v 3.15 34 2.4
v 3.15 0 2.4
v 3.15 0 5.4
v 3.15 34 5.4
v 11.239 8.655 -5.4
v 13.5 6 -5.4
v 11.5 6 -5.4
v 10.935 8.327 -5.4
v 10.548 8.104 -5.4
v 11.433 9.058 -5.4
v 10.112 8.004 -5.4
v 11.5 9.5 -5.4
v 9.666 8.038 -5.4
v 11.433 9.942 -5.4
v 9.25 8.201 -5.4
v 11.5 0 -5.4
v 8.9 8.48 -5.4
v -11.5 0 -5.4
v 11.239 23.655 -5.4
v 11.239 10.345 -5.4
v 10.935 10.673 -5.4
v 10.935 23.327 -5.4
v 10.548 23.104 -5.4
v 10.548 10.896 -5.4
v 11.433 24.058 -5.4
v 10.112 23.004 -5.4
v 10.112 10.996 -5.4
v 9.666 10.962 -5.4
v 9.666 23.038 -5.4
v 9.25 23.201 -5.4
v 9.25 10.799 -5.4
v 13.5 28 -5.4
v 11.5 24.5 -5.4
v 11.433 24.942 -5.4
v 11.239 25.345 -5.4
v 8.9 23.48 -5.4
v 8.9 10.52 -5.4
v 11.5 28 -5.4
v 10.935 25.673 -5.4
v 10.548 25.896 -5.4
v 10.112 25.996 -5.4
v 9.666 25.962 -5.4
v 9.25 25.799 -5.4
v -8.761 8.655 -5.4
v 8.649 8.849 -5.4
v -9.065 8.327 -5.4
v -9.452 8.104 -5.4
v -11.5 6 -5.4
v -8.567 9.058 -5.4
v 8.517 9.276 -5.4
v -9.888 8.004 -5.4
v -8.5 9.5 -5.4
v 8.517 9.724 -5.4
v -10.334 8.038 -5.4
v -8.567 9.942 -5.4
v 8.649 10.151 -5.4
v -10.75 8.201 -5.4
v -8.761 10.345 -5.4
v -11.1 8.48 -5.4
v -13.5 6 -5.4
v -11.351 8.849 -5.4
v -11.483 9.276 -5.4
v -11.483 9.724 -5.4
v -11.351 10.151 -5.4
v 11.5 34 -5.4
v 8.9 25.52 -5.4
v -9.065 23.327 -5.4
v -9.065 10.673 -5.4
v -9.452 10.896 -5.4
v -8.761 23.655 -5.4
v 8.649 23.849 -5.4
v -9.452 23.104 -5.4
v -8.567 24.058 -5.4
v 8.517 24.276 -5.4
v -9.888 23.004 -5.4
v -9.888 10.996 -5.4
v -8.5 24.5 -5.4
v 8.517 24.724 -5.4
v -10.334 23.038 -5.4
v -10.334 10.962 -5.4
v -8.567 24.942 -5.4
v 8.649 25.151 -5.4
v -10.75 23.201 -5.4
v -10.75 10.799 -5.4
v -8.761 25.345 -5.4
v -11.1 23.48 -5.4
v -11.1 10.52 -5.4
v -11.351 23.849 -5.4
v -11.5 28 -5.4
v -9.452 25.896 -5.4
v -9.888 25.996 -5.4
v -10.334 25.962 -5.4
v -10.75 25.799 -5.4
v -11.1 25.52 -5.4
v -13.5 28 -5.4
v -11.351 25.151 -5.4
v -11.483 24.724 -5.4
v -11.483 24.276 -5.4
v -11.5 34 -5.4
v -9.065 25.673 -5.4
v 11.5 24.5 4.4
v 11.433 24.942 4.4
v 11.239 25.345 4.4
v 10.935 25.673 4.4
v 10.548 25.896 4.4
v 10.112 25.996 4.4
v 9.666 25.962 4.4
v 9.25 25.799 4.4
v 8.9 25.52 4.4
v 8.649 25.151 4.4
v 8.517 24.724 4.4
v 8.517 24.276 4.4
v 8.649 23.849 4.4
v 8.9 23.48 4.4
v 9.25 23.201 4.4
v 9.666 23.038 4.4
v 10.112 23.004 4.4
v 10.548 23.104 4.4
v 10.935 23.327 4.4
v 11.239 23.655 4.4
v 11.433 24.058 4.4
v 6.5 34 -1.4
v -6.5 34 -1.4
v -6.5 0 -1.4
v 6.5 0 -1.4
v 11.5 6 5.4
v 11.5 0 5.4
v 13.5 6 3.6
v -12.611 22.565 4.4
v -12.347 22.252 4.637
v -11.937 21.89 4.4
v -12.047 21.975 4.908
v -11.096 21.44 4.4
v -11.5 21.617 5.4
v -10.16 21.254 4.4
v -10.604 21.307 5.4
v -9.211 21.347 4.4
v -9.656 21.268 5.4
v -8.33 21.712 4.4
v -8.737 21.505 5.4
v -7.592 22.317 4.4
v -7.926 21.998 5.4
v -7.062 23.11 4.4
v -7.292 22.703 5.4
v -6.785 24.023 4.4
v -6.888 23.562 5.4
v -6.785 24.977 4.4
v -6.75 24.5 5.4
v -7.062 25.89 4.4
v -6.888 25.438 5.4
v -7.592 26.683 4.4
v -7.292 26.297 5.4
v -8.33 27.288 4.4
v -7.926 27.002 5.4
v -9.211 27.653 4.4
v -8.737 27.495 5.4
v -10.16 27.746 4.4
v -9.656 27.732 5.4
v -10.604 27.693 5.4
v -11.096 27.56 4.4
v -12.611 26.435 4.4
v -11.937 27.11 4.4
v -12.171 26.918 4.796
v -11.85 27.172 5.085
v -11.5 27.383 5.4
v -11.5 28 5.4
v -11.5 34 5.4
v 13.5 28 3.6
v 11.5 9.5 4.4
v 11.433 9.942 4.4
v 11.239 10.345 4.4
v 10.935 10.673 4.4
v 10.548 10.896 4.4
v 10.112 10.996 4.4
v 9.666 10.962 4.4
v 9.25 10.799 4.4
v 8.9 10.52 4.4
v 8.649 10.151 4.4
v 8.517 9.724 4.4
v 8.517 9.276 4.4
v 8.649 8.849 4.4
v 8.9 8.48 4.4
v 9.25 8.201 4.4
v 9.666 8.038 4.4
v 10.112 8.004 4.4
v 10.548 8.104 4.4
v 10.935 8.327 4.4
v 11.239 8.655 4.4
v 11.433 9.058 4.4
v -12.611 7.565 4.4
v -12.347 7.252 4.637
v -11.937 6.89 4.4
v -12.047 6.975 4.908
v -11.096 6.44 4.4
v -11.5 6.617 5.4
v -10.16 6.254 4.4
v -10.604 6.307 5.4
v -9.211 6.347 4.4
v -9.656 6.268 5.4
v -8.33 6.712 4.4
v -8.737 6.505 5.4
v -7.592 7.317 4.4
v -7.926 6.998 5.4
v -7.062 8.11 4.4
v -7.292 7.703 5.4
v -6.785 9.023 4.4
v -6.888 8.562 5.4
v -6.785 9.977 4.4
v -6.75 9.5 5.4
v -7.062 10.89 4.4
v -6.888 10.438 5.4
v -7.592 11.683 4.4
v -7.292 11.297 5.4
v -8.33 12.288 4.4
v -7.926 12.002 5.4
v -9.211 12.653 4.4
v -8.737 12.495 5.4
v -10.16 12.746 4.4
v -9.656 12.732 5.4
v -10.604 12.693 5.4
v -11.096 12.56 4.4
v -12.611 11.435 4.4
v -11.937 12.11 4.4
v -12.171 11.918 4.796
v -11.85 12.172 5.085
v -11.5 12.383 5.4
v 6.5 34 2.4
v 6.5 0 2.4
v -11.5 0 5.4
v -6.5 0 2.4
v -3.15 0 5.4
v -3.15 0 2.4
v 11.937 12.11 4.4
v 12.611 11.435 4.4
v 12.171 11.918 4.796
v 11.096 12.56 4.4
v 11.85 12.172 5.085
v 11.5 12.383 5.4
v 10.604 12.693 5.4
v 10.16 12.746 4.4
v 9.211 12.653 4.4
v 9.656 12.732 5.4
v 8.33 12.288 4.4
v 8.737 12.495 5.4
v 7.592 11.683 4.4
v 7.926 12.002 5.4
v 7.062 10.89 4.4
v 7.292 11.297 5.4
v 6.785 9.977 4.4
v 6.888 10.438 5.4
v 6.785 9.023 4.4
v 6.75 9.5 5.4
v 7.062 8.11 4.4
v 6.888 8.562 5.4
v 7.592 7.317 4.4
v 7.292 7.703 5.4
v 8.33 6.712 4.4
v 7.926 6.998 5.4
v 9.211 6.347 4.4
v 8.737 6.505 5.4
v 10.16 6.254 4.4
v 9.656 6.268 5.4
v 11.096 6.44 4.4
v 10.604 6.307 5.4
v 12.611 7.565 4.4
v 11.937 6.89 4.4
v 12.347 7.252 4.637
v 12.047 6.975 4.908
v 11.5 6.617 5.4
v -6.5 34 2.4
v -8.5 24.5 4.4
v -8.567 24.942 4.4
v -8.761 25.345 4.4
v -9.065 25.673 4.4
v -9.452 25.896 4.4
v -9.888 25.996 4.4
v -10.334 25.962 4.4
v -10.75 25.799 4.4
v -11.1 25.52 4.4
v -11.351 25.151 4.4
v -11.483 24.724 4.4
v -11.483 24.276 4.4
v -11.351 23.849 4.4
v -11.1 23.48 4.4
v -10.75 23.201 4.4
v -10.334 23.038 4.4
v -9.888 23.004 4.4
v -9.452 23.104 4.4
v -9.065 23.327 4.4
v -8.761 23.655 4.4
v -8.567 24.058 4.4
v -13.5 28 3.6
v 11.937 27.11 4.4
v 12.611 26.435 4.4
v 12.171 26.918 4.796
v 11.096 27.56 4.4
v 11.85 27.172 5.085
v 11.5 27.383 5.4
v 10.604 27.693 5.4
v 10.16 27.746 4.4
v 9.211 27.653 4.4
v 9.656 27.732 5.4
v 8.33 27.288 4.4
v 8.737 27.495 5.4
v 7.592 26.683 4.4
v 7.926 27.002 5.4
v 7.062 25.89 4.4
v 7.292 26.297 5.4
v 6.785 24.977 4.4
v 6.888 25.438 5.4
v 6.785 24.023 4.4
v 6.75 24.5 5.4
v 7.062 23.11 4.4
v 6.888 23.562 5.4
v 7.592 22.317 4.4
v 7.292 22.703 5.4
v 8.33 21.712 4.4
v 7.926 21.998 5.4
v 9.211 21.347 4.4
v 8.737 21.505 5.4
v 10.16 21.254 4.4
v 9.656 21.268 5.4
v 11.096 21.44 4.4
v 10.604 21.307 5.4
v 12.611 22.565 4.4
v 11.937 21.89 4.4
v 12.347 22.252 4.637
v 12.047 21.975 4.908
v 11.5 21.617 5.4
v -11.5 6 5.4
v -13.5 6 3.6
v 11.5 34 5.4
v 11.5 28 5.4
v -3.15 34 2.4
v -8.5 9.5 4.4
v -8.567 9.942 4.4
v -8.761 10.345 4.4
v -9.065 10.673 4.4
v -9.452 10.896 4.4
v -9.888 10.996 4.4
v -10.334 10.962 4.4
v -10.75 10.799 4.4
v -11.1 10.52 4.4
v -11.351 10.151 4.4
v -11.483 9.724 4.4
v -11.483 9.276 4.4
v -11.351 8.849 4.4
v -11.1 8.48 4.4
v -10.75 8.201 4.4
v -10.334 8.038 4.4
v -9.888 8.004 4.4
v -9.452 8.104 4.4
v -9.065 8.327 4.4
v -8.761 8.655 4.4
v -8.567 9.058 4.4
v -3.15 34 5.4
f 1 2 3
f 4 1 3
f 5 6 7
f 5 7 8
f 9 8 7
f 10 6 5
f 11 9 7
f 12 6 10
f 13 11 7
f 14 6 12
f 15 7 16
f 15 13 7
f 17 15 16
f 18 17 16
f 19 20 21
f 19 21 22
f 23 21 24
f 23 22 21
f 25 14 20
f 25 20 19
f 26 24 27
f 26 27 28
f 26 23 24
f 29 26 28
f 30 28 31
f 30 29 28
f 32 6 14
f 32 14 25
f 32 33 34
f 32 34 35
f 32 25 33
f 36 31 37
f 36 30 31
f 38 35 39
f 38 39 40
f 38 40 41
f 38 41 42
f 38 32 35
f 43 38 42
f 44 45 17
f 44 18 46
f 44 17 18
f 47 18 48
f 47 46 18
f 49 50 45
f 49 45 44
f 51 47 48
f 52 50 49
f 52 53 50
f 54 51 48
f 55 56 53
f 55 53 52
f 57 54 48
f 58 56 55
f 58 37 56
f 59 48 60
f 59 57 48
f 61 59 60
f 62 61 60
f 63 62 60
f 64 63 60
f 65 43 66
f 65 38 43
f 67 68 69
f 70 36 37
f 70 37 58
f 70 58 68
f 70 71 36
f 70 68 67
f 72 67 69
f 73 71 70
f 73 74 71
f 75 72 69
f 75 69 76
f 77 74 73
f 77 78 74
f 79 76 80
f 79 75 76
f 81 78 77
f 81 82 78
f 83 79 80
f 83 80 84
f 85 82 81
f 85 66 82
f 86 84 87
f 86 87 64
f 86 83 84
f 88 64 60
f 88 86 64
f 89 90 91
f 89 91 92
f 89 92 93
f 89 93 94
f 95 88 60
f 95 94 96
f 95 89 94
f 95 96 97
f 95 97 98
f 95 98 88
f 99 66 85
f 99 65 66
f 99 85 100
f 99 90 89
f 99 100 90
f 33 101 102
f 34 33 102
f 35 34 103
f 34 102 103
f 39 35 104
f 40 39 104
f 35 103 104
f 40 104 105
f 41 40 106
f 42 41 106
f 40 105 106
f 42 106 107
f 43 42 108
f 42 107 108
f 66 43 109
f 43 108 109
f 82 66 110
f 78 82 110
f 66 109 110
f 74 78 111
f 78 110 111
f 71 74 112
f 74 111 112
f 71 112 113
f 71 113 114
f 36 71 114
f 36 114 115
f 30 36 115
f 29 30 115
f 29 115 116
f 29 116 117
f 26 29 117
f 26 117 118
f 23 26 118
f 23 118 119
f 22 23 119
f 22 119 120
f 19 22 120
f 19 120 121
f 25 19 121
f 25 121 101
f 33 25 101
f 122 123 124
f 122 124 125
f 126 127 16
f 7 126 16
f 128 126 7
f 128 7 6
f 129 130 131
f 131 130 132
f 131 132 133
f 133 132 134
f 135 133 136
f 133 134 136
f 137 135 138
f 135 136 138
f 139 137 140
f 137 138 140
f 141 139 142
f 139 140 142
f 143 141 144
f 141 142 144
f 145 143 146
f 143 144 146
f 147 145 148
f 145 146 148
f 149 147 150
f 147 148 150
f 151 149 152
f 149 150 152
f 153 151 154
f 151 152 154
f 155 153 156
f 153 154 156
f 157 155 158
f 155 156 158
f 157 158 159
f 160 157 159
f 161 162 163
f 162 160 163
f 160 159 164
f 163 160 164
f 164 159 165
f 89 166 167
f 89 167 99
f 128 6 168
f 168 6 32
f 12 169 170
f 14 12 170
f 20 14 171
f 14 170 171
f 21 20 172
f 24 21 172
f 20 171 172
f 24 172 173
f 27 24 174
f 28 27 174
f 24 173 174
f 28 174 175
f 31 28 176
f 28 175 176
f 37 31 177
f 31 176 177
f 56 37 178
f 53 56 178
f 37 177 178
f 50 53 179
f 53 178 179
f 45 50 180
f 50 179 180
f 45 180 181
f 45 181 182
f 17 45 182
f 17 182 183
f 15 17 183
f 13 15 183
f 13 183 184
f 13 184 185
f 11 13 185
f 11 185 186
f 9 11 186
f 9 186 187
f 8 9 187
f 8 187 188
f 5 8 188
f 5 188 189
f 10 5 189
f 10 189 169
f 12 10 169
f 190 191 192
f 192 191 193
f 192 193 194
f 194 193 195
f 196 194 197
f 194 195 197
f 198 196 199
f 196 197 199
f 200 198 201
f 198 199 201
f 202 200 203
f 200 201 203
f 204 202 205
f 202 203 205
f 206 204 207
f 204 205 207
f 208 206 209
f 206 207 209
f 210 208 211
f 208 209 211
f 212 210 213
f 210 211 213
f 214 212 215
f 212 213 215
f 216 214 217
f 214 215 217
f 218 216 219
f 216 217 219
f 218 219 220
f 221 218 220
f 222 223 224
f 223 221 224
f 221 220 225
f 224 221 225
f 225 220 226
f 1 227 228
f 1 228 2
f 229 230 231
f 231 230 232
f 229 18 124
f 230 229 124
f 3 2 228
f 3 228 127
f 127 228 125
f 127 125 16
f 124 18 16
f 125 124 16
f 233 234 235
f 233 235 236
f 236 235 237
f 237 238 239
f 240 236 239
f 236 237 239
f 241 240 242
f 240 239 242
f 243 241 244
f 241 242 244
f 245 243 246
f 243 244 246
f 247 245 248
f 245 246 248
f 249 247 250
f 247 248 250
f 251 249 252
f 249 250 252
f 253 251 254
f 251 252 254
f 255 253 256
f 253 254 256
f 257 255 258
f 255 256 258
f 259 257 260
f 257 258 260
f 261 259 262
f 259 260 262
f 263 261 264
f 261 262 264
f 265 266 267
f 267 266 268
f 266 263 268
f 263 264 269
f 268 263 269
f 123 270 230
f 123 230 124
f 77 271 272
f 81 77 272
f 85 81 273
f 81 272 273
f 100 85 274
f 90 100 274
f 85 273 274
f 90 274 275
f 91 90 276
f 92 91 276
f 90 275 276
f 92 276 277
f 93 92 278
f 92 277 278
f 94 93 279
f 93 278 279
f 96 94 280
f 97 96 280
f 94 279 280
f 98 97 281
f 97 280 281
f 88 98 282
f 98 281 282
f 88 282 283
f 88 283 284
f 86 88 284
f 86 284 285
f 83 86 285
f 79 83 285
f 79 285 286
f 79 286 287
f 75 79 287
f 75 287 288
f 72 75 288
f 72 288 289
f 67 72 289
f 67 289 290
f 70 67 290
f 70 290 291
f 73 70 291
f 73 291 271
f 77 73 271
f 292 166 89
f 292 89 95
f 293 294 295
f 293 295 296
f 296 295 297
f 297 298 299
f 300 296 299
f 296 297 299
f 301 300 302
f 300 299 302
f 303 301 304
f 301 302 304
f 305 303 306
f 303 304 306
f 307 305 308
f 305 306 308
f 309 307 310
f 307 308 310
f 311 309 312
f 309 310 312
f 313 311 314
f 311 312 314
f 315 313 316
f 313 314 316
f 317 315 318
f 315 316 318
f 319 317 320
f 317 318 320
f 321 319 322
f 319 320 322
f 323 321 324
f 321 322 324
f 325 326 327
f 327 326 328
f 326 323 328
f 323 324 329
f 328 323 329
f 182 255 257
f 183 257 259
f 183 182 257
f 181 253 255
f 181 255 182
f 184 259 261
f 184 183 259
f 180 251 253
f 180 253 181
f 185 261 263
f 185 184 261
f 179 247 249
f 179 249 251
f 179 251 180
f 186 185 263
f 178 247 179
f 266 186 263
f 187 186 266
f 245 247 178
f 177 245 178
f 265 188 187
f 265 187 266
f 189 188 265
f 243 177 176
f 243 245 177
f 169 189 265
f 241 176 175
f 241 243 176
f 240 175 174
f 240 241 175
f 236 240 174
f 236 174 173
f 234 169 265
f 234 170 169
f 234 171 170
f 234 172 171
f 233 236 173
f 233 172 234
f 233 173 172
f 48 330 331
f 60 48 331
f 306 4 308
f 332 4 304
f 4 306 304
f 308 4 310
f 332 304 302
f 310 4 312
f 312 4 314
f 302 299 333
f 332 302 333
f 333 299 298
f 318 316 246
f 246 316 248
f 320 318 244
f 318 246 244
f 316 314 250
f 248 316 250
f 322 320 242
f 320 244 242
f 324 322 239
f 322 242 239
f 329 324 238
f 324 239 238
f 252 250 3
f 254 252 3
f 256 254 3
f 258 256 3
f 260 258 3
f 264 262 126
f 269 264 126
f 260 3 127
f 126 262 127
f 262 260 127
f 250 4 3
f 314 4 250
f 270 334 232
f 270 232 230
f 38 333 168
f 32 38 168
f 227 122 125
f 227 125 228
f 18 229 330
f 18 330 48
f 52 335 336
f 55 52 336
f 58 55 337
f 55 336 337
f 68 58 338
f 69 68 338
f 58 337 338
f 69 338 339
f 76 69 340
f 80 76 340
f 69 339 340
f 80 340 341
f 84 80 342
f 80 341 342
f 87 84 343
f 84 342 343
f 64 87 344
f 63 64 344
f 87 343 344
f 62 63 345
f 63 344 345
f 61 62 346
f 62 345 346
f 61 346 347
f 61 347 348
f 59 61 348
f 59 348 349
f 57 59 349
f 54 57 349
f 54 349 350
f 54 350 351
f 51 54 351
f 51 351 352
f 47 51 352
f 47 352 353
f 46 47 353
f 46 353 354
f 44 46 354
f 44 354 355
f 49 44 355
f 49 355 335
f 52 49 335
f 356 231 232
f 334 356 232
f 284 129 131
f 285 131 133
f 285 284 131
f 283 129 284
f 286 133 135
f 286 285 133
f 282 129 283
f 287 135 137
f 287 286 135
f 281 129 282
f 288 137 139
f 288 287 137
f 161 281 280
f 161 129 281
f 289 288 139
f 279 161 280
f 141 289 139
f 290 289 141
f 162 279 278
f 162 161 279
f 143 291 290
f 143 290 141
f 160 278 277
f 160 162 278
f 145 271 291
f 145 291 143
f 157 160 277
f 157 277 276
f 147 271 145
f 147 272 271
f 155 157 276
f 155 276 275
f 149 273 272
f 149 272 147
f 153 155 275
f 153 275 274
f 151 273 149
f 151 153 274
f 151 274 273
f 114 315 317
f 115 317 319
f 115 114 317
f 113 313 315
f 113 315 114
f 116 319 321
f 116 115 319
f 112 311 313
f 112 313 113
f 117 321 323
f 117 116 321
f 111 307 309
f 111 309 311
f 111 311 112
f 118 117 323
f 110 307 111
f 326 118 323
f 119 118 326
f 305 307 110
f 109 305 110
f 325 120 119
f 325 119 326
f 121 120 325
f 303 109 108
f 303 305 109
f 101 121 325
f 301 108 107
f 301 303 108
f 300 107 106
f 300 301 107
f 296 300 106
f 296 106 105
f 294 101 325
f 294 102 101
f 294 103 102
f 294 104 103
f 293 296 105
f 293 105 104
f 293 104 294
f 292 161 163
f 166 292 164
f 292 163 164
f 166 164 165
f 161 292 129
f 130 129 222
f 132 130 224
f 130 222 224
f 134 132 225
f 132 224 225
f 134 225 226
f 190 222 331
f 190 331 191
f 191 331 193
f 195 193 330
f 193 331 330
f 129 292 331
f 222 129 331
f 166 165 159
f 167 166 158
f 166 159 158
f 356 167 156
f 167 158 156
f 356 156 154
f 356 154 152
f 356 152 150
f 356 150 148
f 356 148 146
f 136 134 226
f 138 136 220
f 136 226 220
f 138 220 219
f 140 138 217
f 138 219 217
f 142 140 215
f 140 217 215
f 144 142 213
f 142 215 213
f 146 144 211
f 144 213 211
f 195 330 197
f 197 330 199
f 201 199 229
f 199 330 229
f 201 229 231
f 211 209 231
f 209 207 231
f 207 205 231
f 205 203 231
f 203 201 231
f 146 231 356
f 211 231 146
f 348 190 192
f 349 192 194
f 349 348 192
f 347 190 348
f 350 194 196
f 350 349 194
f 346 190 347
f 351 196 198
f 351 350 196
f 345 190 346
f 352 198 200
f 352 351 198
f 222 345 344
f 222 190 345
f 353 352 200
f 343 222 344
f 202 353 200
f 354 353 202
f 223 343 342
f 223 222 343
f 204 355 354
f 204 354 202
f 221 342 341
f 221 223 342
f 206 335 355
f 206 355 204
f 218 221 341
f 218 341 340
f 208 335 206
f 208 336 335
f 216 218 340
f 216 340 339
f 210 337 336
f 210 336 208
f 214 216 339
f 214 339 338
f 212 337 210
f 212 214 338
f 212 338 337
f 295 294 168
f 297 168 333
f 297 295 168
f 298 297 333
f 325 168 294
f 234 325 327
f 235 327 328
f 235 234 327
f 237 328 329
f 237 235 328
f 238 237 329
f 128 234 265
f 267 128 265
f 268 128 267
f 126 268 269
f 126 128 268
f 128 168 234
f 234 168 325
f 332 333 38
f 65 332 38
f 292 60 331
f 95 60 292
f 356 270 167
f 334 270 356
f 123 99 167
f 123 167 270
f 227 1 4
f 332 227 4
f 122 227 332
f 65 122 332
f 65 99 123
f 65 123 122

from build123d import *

# Parameters (mm, degrees)
SKETCH_1_W          = 23
SKETCH_1_H          = 10.8
EXTRUDE_1_DEPTH     = 34
CUT_EXTRUDE_1_DEPTH = 35
SKETCH_3_W          = 7
SKETCH_3_H          = 22
EXTRUDE_2_DEPTH     = 9
EXTRUDE_3_DEPTH     = 22
SKETCH_7_R          = 3.25
CUT_EXTRUDE_7_DEPTH = 1
CUT_EXTRUDE_8_REACH = 11.8
SKETCH_8_R          = 1.5


with BuildPart() as part:
    # 草图1 → 凸台-拉伸1 (new body)
    with BuildSketch(Plane(origin=(0, 0, 0), x_dir=(1, 0, 0), z_dir=(0, 1, 0))):
        Rectangle(SKETCH_1_W, SKETCH_1_H)
    extrude(amount=EXTRUDE_1_DEPTH)

    # 草图2 → 切除-拉伸1 (cut, through all)
    with BuildSketch(Plane(origin=(0, 34, 0), x_dir=(1, 0, 0), z_dir=(0, 1, 0))):
        Polygon((-6.5, 1.4), (6.5, 1.4), (6.5, -2.4), (3.15, -2.4), (3.15, -5.4), (-3.15, -5.4), (-3.15, -2.4), (-6.5, -2.4), align=None)
    extrude(amount=-CUT_EXTRUDE_1_DEPTH, mode=Mode.SUBTRACT)

    # 草图3 → 凸台-拉伸2 (add)
    with BuildSketch(Plane(origin=(0, 0, -5.4), x_dir=(-1, 0, 0), z_dir=(0, 0, -1))):
        with Locations((-10, 17)):
            Rectangle(SKETCH_3_W, SKETCH_3_H)
        with Locations((10, 17)):
            Rectangle(SKETCH_3_W, SKETCH_3_H)
    extrude(amount=-EXTRUDE_2_DEPTH)

    # 草图5 → 凸台-拉伸3 (add)
    with BuildSketch(Plane.XZ.offset(-6)):
        Polygon((11.5, 5.4), (11.5, 3.6), (13.5, 3.6), align=None)
        Polygon((-13.5, 3.6), (-11.5, 5.4), (-11.5, 3.6), align=None)
    extrude(amount=-EXTRUDE_3_DEPTH)

    # 草图7 → 切除-拉伸7 (cut)
    with BuildSketch(Plane.XY.offset(5.4)):
        with Locations((-10, 24.5)):
            Circle(SKETCH_7_R)
        with Locations((-10, 9.5)):
            Circle(SKETCH_7_R)
        with Locations((10, 9.5)):
            Circle(SKETCH_7_R)
        with Locations((10, 24.5)):
            Circle(SKETCH_7_R)
    extrude(amount=-CUT_EXTRUDE_7_DEPTH, mode=Mode.SUBTRACT)

    # 草图8 → 切除-拉伸8 (cut, up to next)
    with BuildSketch(Plane.XY.offset(4.4), mode=Mode.PRIVATE) as cut_extrude_8_sk1:
        with Locations((-10, 24.5)):
            Circle(SKETCH_8_R)
    cut_extrude_8_tool1 = extrude(cut_extrude_8_sk1.sketch, amount=-CUT_EXTRUDE_8_REACH, mode=Mode.PRIVATE) & part.part
    add(cut_extrude_8_tool1.solids().sort_by_distance((-10, 24.5, 4.4))[0], mode=Mode.SUBTRACT)
    # 草图8 → 切除-拉伸8 (cut, up to next)
    with BuildSketch(Plane.XY.offset(4.4), mode=Mode.PRIVATE) as cut_extrude_8_sk2:
        with Locations((10, 24.5)):
            Circle(SKETCH_8_R)
    cut_extrude_8_tool2 = extrude(cut_extrude_8_sk2.sketch, amount=-CUT_EXTRUDE_8_REACH, mode=Mode.PRIVATE) & part.part
    add(cut_extrude_8_tool2.solids().sort_by_distance((10, 24.5, 4.4))[0], mode=Mode.SUBTRACT)
    # 草图8 → 切除-拉伸8 (cut, up to next)
    with BuildSketch(Plane.XY.offset(4.4), mode=Mode.PRIVATE) as cut_extrude_8_sk3:
        with Locations((-10, 9.5)):
            Circle(SKETCH_8_R)
    cut_extrude_8_tool3 = extrude(cut_extrude_8_sk3.sketch, amount=-CUT_EXTRUDE_8_REACH, mode=Mode.PRIVATE) & part.part
    add(cut_extrude_8_tool3.solids().sort_by_distance((-10, 9.5, 4.4))[0], mode=Mode.SUBTRACT)
    # 草图8 → 切除-拉伸8 (cut, up to next)
    with BuildSketch(Plane.XY.offset(4.4), mode=Mode.PRIVATE) as cut_extrude_8_sk4:
        with Locations((10, 9.5)):
            Circle(SKETCH_8_R)
    cut_extrude_8_tool4 = extrude(cut_extrude_8_sk4.sketch, amount=-CUT_EXTRUDE_8_REACH, mode=Mode.PRIVATE) & part.part
    add(cut_extrude_8_tool4.solids().sort_by_distance((10, 9.5, 4.4))[0], mode=Mode.SUBTRACT)


solid = part.part
